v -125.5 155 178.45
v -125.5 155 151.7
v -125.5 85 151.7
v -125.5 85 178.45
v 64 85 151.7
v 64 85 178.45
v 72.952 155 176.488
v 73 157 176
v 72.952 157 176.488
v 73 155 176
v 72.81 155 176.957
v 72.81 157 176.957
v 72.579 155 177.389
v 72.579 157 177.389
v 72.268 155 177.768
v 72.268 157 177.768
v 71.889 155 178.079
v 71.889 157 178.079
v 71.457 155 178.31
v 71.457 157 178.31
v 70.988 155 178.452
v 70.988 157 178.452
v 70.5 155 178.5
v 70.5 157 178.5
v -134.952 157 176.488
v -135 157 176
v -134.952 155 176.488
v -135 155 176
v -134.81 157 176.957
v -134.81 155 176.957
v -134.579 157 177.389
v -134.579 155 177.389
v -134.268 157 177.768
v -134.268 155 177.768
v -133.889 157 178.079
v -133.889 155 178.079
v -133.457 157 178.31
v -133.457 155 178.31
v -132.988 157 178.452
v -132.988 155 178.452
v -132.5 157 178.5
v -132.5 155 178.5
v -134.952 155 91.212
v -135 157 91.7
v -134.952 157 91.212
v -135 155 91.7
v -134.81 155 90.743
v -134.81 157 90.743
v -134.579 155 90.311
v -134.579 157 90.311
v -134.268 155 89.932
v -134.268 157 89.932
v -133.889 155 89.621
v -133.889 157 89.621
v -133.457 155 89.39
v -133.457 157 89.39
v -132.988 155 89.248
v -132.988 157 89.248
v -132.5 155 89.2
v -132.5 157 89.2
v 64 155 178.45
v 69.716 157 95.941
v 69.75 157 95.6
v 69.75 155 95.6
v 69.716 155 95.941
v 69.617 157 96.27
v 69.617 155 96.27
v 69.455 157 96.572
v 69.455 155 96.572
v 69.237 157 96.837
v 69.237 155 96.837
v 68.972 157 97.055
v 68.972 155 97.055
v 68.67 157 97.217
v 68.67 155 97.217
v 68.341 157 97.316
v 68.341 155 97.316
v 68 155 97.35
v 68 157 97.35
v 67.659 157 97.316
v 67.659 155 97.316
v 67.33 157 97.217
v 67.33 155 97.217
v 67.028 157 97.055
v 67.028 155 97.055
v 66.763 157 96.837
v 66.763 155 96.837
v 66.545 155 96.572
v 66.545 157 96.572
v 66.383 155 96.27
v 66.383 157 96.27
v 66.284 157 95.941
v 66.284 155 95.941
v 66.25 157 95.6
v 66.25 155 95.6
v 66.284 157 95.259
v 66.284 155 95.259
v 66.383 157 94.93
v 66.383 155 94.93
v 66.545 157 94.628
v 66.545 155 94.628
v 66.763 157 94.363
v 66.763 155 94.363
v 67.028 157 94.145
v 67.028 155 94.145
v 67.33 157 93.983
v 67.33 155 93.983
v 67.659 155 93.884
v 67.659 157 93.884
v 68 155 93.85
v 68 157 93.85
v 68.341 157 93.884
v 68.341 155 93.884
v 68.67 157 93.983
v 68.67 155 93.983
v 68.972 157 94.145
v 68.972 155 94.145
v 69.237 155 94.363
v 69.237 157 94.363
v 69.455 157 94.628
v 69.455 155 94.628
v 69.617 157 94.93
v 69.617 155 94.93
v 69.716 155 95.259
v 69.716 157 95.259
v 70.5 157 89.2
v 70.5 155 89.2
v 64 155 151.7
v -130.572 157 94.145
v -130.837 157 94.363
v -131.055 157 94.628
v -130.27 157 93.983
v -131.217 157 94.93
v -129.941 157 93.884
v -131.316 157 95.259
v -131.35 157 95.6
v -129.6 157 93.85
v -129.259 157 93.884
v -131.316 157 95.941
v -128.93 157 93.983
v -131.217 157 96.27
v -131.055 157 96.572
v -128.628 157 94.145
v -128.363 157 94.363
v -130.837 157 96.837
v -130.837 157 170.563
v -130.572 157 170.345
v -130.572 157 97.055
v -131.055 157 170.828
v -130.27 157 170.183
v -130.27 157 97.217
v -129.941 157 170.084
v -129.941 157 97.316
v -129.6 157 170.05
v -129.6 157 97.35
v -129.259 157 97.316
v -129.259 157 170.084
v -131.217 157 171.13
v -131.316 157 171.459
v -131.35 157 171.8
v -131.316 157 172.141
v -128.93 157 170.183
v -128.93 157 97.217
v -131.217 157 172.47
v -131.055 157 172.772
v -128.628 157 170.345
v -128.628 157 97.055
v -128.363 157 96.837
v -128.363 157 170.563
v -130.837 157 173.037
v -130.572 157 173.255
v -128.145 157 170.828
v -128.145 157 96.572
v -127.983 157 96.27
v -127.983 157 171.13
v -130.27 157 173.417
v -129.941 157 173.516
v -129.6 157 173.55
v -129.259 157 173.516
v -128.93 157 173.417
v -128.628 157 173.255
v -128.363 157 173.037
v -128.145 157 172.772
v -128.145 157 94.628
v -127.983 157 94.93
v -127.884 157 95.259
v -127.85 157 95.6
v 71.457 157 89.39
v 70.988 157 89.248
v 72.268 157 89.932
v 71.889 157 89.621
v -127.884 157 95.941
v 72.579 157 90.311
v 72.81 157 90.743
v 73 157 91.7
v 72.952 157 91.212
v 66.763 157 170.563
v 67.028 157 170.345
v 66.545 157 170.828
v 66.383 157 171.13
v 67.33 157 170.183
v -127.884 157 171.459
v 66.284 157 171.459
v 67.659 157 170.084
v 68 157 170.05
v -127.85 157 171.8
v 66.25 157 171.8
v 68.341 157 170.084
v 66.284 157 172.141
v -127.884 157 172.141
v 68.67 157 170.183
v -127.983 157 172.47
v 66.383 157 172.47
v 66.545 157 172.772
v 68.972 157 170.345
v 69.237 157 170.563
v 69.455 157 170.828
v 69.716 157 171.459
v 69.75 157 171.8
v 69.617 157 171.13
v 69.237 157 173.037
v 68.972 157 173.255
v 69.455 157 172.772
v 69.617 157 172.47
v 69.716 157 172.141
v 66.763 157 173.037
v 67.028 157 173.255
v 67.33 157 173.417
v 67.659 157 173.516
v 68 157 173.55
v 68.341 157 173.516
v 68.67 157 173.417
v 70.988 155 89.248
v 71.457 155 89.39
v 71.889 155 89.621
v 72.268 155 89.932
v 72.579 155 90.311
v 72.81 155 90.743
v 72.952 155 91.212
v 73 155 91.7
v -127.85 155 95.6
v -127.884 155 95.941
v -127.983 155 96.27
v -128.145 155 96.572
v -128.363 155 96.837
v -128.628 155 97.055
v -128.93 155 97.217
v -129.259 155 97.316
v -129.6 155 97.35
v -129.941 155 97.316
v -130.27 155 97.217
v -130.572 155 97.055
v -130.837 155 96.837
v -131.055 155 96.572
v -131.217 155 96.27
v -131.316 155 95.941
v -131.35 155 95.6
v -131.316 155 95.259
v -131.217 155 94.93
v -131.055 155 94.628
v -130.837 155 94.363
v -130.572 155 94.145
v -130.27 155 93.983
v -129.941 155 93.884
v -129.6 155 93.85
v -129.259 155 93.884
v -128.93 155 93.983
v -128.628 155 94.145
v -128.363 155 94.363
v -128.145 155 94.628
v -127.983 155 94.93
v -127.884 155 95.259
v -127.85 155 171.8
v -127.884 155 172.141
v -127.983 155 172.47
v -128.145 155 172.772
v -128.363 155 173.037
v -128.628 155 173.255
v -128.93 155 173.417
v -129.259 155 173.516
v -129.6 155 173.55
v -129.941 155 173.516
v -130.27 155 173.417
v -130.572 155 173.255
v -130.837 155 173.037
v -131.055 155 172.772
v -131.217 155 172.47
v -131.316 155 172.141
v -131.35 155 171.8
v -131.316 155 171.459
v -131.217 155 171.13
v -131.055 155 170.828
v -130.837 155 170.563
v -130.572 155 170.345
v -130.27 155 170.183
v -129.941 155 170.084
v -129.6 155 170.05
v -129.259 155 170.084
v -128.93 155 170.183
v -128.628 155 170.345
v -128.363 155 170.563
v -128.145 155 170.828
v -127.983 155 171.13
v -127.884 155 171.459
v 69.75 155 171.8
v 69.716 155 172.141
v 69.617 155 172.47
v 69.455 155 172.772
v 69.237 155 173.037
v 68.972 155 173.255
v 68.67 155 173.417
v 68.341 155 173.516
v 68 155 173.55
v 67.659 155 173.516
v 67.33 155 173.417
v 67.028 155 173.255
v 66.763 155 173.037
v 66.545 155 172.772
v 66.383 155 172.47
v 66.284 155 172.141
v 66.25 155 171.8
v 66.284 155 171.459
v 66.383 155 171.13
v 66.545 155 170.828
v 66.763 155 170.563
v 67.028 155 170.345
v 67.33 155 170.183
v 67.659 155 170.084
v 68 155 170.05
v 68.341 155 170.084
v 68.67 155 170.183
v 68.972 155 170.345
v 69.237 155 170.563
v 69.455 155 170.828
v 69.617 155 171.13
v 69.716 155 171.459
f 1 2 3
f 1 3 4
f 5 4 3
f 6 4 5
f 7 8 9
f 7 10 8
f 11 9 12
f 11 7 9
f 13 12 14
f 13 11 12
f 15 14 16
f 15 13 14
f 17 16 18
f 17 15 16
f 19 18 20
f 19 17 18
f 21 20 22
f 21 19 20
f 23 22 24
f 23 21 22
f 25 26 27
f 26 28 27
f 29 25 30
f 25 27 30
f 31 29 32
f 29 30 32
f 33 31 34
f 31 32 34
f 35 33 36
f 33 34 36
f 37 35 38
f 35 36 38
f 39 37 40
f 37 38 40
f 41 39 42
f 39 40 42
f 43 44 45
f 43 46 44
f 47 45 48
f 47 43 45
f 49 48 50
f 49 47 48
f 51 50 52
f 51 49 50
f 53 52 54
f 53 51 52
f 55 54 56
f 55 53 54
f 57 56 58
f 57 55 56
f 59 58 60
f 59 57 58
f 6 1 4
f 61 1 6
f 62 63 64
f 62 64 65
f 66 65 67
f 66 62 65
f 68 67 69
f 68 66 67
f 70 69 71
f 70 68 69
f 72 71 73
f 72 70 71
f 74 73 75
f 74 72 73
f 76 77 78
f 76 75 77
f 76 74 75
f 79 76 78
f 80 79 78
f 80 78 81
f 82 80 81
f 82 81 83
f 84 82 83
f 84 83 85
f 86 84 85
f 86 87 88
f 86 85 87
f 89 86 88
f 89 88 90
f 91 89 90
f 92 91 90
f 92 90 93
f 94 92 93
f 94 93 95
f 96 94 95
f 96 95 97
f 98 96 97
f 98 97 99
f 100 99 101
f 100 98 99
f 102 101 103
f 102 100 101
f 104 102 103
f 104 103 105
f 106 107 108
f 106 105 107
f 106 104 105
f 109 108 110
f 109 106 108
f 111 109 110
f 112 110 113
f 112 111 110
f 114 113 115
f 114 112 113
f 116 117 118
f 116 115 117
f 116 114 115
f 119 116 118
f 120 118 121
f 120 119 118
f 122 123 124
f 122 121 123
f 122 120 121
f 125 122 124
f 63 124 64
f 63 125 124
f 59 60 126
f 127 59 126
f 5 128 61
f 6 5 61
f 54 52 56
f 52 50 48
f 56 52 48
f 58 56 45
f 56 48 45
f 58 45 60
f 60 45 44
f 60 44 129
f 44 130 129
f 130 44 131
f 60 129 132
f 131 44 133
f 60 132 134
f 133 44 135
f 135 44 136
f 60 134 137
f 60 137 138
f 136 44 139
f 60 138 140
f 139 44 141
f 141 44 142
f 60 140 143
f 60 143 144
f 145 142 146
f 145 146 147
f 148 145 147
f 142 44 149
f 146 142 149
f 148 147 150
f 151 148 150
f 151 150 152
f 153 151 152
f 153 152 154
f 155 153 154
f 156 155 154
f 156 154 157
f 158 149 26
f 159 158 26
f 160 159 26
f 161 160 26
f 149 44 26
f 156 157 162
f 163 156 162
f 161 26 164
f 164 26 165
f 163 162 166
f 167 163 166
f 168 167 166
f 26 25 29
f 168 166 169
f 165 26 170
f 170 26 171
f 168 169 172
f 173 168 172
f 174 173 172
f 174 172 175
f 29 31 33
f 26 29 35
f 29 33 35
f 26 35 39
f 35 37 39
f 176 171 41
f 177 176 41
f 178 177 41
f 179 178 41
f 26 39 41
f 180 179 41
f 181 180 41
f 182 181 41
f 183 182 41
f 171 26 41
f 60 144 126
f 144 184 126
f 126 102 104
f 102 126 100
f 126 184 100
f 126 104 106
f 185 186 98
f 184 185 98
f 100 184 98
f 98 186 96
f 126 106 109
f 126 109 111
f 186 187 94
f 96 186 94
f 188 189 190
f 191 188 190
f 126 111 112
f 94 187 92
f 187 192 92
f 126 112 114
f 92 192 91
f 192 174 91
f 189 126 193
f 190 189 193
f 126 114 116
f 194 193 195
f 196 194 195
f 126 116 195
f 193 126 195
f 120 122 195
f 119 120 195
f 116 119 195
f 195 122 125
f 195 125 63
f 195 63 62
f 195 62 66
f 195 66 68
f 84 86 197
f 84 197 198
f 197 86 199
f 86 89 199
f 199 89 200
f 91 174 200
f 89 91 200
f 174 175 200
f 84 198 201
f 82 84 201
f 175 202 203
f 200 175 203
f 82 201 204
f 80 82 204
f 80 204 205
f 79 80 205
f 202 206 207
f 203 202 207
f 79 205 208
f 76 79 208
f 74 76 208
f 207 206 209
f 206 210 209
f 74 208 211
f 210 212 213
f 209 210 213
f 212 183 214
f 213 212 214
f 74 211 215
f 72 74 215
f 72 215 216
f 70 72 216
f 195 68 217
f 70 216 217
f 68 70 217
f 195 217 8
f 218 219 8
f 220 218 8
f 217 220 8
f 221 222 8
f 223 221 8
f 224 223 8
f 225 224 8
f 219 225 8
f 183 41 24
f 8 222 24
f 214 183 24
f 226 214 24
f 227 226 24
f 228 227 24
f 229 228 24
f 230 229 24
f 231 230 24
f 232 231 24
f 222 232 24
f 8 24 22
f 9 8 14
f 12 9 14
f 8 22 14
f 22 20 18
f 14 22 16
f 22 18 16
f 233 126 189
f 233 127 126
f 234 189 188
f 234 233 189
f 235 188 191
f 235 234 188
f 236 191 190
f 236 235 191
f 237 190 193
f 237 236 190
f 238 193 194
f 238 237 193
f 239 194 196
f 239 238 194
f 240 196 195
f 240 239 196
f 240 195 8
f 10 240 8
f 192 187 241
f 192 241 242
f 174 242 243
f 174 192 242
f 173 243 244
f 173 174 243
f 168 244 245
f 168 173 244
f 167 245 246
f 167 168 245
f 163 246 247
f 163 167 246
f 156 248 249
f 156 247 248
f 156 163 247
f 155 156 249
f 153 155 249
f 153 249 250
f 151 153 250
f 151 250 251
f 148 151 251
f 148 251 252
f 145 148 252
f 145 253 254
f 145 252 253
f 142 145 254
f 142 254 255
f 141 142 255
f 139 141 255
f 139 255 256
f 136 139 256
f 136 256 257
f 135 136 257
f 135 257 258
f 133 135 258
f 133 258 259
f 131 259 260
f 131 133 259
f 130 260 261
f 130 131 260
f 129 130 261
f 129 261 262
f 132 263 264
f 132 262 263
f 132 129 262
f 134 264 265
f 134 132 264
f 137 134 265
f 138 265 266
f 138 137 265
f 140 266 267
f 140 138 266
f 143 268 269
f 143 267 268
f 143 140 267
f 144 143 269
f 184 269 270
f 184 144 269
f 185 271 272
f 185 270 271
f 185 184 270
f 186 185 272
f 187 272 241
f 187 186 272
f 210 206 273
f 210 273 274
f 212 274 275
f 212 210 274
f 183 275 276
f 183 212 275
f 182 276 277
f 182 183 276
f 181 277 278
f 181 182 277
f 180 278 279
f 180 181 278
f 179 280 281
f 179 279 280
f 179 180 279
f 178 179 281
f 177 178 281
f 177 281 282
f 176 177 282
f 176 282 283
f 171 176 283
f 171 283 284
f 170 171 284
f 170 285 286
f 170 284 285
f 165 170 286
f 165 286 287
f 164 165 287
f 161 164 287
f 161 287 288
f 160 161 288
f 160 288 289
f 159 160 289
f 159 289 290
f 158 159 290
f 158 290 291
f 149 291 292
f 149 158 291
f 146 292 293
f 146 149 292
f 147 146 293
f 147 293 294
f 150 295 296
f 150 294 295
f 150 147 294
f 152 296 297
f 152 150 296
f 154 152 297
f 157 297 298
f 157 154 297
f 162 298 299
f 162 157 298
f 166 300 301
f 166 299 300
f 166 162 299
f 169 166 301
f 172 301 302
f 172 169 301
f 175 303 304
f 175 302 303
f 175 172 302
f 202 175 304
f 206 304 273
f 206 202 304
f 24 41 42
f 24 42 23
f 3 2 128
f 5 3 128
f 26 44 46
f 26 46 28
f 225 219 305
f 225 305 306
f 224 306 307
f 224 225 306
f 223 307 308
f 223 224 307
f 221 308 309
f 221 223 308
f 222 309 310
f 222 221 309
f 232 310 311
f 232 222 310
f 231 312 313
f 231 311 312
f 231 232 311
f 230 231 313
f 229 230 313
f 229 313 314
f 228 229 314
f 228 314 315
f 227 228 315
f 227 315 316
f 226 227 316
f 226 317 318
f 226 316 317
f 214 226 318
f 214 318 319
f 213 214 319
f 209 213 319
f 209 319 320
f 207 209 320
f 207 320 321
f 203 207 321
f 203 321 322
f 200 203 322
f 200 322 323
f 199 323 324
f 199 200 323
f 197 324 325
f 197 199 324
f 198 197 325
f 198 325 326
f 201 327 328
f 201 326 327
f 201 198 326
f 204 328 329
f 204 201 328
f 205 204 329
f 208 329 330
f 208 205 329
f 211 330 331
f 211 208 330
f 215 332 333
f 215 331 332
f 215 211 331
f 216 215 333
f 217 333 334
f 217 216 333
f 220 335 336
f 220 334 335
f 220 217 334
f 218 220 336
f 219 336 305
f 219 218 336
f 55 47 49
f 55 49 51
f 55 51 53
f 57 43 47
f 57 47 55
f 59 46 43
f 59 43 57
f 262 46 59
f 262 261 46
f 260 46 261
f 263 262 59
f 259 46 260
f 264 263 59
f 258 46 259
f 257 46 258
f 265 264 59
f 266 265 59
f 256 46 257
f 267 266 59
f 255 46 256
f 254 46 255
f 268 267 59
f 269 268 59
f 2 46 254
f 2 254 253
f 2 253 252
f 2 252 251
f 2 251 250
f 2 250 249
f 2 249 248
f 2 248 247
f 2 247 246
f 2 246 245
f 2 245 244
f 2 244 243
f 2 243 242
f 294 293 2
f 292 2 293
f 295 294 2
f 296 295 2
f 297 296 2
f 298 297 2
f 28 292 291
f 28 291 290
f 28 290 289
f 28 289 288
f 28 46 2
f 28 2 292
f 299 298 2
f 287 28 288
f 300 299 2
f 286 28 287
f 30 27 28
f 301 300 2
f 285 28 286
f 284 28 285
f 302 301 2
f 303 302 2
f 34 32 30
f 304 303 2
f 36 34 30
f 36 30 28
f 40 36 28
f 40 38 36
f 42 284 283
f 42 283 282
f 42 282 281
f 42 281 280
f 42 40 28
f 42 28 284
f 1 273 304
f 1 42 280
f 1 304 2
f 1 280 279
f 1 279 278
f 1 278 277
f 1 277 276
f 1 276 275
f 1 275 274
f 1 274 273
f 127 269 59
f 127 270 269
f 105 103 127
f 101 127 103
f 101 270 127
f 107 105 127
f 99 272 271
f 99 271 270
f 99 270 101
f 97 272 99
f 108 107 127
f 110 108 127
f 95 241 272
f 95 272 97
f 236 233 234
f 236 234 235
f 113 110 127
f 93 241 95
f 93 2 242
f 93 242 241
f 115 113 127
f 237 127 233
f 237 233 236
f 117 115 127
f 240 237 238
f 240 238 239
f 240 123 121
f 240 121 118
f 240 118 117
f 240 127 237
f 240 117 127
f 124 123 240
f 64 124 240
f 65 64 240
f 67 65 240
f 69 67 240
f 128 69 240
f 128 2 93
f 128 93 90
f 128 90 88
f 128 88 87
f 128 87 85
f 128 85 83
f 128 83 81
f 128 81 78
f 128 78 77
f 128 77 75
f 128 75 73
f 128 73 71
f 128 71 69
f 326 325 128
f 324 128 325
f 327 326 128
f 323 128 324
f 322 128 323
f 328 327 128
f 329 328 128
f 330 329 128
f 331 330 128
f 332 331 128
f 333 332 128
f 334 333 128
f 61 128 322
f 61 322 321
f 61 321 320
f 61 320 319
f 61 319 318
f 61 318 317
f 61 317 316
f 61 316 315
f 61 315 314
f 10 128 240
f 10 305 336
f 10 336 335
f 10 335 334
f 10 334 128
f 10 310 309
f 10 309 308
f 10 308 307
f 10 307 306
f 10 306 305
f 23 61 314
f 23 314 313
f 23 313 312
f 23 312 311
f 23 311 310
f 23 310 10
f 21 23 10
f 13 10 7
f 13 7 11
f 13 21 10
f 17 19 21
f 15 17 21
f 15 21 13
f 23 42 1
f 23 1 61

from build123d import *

# Parameters (mm, degrees)
CYLINDER001_R       = 1.75
CYLINDER001_DEPTH   = 10
CYLINDER002_R       = 1.75
CYLINDER002_DEPTH   = 10
CYLINDER003_R       = 1.75
CYLINDER003_DEPTH   = 10
CYLINDER_R          = 1.75
CYLINDER_DEPTH      = 10
BOX001_W            = 189.5
BOX001_H            = 26.75
BOX001_DEPTH        = 70
BOX_W               = 208
BOX_H               = 89.3
BOX_DEPTH           = 2
FILLET_R            = 2.5
CUT_PLACEMENT_ANGLE = 90


with BuildPart() as cylinder001:
    # Cylinder001 → Cylinder001 (new body)
    with BuildSketch(Plane(origin=(5.4, 82.6, 0), x_dir=(1, 0, 0), z_dir=(0, 0, 1))):
        Circle(CYLINDER001_R)
    extrude(amount=CYLINDER001_DEPTH)


with BuildPart() as cylinder002:
    # Cylinder002 → Cylinder002 (new body)
    with BuildSketch(Plane(origin=(203, 82.6, 0), x_dir=(1, 0, 0), z_dir=(0, 0, 1))):
        Circle(CYLINDER002_R)
    extrude(amount=CYLINDER002_DEPTH)


with BuildPart() as cylinder003:
    # Cylinder003 → Cylinder003 (new body)
    with BuildSketch(Plane(origin=(203, 6.4, 0), x_dir=(1, 0, 0), z_dir=(0, 0, 1))):
        Circle(CYLINDER003_R)
    extrude(amount=CYLINDER003_DEPTH)


with BuildPart() as base_hole:
    # Cylinder → Cylinder (new body)
    with BuildSketch(Plane(origin=(5.4, 6.4, 0), x_dir=(1, 0, 0), z_dir=(0, 0, 1))):
        Circle(CYLINDER_R)
    extrude(amount=CYLINDER_DEPTH)

    # Fusion: union Cylinder001, Cylinder002, Cylinder003
    add(cylinder001.part)
    add(cylinder002.part)
    add(cylinder003.part)


with BuildPart() as base_hole_1:
    # Fusion placement: moved
    add(base_hole.part.moved(Location((0, 0, -4))))


with BuildPart() as ozone_monitor:
    # Box001 → Box001 (new body)
    with BuildSketch(Plane(origin=(9.5, 62.5, 2), x_dir=(1, 0, 0), z_dir=(0, 0, 1))):
        with Locations((94.75, 13.375)):
            Rectangle(BOX001_W, BOX001_H)
    extrude(amount=BOX001_DEPTH)


with BuildPart() as ozone_module:
    # Box → Box (new body)
    with BuildSketch(Plane.XY):
        with Locations((104, 44.65)):
            Rectangle(BOX_W, BOX_H)
    extrude(amount=BOX_DEPTH)

    # Fillet
    fillet_edges = [ozone_module.edges().sort_by_distance(p)[0] for p in [
        (0, 0, 1),
        (0, 89.3, 1),
        (208, 0, 1),
        (208, 89.3, 1),
    ]]
    fillet(fillet_edges, radius=FILLET_R)

    # Fusion001: union Ozone_monitor
    add(ozone_monitor.part)

    # Cut: cut Base_hole
    add(base_hole_1.part, mode=Mode.SUBTRACT)


with BuildPart() as ozone_module_1:
    # Cut placement: moved
    add(ozone_module.part.moved(Location((-135, 157, 89.2))).rotate(Axis((-135, 157, 89.2), (1, 0, 0)), CUT_PLACEMENT_ANGLE))


solid = ozone_module_1.part
